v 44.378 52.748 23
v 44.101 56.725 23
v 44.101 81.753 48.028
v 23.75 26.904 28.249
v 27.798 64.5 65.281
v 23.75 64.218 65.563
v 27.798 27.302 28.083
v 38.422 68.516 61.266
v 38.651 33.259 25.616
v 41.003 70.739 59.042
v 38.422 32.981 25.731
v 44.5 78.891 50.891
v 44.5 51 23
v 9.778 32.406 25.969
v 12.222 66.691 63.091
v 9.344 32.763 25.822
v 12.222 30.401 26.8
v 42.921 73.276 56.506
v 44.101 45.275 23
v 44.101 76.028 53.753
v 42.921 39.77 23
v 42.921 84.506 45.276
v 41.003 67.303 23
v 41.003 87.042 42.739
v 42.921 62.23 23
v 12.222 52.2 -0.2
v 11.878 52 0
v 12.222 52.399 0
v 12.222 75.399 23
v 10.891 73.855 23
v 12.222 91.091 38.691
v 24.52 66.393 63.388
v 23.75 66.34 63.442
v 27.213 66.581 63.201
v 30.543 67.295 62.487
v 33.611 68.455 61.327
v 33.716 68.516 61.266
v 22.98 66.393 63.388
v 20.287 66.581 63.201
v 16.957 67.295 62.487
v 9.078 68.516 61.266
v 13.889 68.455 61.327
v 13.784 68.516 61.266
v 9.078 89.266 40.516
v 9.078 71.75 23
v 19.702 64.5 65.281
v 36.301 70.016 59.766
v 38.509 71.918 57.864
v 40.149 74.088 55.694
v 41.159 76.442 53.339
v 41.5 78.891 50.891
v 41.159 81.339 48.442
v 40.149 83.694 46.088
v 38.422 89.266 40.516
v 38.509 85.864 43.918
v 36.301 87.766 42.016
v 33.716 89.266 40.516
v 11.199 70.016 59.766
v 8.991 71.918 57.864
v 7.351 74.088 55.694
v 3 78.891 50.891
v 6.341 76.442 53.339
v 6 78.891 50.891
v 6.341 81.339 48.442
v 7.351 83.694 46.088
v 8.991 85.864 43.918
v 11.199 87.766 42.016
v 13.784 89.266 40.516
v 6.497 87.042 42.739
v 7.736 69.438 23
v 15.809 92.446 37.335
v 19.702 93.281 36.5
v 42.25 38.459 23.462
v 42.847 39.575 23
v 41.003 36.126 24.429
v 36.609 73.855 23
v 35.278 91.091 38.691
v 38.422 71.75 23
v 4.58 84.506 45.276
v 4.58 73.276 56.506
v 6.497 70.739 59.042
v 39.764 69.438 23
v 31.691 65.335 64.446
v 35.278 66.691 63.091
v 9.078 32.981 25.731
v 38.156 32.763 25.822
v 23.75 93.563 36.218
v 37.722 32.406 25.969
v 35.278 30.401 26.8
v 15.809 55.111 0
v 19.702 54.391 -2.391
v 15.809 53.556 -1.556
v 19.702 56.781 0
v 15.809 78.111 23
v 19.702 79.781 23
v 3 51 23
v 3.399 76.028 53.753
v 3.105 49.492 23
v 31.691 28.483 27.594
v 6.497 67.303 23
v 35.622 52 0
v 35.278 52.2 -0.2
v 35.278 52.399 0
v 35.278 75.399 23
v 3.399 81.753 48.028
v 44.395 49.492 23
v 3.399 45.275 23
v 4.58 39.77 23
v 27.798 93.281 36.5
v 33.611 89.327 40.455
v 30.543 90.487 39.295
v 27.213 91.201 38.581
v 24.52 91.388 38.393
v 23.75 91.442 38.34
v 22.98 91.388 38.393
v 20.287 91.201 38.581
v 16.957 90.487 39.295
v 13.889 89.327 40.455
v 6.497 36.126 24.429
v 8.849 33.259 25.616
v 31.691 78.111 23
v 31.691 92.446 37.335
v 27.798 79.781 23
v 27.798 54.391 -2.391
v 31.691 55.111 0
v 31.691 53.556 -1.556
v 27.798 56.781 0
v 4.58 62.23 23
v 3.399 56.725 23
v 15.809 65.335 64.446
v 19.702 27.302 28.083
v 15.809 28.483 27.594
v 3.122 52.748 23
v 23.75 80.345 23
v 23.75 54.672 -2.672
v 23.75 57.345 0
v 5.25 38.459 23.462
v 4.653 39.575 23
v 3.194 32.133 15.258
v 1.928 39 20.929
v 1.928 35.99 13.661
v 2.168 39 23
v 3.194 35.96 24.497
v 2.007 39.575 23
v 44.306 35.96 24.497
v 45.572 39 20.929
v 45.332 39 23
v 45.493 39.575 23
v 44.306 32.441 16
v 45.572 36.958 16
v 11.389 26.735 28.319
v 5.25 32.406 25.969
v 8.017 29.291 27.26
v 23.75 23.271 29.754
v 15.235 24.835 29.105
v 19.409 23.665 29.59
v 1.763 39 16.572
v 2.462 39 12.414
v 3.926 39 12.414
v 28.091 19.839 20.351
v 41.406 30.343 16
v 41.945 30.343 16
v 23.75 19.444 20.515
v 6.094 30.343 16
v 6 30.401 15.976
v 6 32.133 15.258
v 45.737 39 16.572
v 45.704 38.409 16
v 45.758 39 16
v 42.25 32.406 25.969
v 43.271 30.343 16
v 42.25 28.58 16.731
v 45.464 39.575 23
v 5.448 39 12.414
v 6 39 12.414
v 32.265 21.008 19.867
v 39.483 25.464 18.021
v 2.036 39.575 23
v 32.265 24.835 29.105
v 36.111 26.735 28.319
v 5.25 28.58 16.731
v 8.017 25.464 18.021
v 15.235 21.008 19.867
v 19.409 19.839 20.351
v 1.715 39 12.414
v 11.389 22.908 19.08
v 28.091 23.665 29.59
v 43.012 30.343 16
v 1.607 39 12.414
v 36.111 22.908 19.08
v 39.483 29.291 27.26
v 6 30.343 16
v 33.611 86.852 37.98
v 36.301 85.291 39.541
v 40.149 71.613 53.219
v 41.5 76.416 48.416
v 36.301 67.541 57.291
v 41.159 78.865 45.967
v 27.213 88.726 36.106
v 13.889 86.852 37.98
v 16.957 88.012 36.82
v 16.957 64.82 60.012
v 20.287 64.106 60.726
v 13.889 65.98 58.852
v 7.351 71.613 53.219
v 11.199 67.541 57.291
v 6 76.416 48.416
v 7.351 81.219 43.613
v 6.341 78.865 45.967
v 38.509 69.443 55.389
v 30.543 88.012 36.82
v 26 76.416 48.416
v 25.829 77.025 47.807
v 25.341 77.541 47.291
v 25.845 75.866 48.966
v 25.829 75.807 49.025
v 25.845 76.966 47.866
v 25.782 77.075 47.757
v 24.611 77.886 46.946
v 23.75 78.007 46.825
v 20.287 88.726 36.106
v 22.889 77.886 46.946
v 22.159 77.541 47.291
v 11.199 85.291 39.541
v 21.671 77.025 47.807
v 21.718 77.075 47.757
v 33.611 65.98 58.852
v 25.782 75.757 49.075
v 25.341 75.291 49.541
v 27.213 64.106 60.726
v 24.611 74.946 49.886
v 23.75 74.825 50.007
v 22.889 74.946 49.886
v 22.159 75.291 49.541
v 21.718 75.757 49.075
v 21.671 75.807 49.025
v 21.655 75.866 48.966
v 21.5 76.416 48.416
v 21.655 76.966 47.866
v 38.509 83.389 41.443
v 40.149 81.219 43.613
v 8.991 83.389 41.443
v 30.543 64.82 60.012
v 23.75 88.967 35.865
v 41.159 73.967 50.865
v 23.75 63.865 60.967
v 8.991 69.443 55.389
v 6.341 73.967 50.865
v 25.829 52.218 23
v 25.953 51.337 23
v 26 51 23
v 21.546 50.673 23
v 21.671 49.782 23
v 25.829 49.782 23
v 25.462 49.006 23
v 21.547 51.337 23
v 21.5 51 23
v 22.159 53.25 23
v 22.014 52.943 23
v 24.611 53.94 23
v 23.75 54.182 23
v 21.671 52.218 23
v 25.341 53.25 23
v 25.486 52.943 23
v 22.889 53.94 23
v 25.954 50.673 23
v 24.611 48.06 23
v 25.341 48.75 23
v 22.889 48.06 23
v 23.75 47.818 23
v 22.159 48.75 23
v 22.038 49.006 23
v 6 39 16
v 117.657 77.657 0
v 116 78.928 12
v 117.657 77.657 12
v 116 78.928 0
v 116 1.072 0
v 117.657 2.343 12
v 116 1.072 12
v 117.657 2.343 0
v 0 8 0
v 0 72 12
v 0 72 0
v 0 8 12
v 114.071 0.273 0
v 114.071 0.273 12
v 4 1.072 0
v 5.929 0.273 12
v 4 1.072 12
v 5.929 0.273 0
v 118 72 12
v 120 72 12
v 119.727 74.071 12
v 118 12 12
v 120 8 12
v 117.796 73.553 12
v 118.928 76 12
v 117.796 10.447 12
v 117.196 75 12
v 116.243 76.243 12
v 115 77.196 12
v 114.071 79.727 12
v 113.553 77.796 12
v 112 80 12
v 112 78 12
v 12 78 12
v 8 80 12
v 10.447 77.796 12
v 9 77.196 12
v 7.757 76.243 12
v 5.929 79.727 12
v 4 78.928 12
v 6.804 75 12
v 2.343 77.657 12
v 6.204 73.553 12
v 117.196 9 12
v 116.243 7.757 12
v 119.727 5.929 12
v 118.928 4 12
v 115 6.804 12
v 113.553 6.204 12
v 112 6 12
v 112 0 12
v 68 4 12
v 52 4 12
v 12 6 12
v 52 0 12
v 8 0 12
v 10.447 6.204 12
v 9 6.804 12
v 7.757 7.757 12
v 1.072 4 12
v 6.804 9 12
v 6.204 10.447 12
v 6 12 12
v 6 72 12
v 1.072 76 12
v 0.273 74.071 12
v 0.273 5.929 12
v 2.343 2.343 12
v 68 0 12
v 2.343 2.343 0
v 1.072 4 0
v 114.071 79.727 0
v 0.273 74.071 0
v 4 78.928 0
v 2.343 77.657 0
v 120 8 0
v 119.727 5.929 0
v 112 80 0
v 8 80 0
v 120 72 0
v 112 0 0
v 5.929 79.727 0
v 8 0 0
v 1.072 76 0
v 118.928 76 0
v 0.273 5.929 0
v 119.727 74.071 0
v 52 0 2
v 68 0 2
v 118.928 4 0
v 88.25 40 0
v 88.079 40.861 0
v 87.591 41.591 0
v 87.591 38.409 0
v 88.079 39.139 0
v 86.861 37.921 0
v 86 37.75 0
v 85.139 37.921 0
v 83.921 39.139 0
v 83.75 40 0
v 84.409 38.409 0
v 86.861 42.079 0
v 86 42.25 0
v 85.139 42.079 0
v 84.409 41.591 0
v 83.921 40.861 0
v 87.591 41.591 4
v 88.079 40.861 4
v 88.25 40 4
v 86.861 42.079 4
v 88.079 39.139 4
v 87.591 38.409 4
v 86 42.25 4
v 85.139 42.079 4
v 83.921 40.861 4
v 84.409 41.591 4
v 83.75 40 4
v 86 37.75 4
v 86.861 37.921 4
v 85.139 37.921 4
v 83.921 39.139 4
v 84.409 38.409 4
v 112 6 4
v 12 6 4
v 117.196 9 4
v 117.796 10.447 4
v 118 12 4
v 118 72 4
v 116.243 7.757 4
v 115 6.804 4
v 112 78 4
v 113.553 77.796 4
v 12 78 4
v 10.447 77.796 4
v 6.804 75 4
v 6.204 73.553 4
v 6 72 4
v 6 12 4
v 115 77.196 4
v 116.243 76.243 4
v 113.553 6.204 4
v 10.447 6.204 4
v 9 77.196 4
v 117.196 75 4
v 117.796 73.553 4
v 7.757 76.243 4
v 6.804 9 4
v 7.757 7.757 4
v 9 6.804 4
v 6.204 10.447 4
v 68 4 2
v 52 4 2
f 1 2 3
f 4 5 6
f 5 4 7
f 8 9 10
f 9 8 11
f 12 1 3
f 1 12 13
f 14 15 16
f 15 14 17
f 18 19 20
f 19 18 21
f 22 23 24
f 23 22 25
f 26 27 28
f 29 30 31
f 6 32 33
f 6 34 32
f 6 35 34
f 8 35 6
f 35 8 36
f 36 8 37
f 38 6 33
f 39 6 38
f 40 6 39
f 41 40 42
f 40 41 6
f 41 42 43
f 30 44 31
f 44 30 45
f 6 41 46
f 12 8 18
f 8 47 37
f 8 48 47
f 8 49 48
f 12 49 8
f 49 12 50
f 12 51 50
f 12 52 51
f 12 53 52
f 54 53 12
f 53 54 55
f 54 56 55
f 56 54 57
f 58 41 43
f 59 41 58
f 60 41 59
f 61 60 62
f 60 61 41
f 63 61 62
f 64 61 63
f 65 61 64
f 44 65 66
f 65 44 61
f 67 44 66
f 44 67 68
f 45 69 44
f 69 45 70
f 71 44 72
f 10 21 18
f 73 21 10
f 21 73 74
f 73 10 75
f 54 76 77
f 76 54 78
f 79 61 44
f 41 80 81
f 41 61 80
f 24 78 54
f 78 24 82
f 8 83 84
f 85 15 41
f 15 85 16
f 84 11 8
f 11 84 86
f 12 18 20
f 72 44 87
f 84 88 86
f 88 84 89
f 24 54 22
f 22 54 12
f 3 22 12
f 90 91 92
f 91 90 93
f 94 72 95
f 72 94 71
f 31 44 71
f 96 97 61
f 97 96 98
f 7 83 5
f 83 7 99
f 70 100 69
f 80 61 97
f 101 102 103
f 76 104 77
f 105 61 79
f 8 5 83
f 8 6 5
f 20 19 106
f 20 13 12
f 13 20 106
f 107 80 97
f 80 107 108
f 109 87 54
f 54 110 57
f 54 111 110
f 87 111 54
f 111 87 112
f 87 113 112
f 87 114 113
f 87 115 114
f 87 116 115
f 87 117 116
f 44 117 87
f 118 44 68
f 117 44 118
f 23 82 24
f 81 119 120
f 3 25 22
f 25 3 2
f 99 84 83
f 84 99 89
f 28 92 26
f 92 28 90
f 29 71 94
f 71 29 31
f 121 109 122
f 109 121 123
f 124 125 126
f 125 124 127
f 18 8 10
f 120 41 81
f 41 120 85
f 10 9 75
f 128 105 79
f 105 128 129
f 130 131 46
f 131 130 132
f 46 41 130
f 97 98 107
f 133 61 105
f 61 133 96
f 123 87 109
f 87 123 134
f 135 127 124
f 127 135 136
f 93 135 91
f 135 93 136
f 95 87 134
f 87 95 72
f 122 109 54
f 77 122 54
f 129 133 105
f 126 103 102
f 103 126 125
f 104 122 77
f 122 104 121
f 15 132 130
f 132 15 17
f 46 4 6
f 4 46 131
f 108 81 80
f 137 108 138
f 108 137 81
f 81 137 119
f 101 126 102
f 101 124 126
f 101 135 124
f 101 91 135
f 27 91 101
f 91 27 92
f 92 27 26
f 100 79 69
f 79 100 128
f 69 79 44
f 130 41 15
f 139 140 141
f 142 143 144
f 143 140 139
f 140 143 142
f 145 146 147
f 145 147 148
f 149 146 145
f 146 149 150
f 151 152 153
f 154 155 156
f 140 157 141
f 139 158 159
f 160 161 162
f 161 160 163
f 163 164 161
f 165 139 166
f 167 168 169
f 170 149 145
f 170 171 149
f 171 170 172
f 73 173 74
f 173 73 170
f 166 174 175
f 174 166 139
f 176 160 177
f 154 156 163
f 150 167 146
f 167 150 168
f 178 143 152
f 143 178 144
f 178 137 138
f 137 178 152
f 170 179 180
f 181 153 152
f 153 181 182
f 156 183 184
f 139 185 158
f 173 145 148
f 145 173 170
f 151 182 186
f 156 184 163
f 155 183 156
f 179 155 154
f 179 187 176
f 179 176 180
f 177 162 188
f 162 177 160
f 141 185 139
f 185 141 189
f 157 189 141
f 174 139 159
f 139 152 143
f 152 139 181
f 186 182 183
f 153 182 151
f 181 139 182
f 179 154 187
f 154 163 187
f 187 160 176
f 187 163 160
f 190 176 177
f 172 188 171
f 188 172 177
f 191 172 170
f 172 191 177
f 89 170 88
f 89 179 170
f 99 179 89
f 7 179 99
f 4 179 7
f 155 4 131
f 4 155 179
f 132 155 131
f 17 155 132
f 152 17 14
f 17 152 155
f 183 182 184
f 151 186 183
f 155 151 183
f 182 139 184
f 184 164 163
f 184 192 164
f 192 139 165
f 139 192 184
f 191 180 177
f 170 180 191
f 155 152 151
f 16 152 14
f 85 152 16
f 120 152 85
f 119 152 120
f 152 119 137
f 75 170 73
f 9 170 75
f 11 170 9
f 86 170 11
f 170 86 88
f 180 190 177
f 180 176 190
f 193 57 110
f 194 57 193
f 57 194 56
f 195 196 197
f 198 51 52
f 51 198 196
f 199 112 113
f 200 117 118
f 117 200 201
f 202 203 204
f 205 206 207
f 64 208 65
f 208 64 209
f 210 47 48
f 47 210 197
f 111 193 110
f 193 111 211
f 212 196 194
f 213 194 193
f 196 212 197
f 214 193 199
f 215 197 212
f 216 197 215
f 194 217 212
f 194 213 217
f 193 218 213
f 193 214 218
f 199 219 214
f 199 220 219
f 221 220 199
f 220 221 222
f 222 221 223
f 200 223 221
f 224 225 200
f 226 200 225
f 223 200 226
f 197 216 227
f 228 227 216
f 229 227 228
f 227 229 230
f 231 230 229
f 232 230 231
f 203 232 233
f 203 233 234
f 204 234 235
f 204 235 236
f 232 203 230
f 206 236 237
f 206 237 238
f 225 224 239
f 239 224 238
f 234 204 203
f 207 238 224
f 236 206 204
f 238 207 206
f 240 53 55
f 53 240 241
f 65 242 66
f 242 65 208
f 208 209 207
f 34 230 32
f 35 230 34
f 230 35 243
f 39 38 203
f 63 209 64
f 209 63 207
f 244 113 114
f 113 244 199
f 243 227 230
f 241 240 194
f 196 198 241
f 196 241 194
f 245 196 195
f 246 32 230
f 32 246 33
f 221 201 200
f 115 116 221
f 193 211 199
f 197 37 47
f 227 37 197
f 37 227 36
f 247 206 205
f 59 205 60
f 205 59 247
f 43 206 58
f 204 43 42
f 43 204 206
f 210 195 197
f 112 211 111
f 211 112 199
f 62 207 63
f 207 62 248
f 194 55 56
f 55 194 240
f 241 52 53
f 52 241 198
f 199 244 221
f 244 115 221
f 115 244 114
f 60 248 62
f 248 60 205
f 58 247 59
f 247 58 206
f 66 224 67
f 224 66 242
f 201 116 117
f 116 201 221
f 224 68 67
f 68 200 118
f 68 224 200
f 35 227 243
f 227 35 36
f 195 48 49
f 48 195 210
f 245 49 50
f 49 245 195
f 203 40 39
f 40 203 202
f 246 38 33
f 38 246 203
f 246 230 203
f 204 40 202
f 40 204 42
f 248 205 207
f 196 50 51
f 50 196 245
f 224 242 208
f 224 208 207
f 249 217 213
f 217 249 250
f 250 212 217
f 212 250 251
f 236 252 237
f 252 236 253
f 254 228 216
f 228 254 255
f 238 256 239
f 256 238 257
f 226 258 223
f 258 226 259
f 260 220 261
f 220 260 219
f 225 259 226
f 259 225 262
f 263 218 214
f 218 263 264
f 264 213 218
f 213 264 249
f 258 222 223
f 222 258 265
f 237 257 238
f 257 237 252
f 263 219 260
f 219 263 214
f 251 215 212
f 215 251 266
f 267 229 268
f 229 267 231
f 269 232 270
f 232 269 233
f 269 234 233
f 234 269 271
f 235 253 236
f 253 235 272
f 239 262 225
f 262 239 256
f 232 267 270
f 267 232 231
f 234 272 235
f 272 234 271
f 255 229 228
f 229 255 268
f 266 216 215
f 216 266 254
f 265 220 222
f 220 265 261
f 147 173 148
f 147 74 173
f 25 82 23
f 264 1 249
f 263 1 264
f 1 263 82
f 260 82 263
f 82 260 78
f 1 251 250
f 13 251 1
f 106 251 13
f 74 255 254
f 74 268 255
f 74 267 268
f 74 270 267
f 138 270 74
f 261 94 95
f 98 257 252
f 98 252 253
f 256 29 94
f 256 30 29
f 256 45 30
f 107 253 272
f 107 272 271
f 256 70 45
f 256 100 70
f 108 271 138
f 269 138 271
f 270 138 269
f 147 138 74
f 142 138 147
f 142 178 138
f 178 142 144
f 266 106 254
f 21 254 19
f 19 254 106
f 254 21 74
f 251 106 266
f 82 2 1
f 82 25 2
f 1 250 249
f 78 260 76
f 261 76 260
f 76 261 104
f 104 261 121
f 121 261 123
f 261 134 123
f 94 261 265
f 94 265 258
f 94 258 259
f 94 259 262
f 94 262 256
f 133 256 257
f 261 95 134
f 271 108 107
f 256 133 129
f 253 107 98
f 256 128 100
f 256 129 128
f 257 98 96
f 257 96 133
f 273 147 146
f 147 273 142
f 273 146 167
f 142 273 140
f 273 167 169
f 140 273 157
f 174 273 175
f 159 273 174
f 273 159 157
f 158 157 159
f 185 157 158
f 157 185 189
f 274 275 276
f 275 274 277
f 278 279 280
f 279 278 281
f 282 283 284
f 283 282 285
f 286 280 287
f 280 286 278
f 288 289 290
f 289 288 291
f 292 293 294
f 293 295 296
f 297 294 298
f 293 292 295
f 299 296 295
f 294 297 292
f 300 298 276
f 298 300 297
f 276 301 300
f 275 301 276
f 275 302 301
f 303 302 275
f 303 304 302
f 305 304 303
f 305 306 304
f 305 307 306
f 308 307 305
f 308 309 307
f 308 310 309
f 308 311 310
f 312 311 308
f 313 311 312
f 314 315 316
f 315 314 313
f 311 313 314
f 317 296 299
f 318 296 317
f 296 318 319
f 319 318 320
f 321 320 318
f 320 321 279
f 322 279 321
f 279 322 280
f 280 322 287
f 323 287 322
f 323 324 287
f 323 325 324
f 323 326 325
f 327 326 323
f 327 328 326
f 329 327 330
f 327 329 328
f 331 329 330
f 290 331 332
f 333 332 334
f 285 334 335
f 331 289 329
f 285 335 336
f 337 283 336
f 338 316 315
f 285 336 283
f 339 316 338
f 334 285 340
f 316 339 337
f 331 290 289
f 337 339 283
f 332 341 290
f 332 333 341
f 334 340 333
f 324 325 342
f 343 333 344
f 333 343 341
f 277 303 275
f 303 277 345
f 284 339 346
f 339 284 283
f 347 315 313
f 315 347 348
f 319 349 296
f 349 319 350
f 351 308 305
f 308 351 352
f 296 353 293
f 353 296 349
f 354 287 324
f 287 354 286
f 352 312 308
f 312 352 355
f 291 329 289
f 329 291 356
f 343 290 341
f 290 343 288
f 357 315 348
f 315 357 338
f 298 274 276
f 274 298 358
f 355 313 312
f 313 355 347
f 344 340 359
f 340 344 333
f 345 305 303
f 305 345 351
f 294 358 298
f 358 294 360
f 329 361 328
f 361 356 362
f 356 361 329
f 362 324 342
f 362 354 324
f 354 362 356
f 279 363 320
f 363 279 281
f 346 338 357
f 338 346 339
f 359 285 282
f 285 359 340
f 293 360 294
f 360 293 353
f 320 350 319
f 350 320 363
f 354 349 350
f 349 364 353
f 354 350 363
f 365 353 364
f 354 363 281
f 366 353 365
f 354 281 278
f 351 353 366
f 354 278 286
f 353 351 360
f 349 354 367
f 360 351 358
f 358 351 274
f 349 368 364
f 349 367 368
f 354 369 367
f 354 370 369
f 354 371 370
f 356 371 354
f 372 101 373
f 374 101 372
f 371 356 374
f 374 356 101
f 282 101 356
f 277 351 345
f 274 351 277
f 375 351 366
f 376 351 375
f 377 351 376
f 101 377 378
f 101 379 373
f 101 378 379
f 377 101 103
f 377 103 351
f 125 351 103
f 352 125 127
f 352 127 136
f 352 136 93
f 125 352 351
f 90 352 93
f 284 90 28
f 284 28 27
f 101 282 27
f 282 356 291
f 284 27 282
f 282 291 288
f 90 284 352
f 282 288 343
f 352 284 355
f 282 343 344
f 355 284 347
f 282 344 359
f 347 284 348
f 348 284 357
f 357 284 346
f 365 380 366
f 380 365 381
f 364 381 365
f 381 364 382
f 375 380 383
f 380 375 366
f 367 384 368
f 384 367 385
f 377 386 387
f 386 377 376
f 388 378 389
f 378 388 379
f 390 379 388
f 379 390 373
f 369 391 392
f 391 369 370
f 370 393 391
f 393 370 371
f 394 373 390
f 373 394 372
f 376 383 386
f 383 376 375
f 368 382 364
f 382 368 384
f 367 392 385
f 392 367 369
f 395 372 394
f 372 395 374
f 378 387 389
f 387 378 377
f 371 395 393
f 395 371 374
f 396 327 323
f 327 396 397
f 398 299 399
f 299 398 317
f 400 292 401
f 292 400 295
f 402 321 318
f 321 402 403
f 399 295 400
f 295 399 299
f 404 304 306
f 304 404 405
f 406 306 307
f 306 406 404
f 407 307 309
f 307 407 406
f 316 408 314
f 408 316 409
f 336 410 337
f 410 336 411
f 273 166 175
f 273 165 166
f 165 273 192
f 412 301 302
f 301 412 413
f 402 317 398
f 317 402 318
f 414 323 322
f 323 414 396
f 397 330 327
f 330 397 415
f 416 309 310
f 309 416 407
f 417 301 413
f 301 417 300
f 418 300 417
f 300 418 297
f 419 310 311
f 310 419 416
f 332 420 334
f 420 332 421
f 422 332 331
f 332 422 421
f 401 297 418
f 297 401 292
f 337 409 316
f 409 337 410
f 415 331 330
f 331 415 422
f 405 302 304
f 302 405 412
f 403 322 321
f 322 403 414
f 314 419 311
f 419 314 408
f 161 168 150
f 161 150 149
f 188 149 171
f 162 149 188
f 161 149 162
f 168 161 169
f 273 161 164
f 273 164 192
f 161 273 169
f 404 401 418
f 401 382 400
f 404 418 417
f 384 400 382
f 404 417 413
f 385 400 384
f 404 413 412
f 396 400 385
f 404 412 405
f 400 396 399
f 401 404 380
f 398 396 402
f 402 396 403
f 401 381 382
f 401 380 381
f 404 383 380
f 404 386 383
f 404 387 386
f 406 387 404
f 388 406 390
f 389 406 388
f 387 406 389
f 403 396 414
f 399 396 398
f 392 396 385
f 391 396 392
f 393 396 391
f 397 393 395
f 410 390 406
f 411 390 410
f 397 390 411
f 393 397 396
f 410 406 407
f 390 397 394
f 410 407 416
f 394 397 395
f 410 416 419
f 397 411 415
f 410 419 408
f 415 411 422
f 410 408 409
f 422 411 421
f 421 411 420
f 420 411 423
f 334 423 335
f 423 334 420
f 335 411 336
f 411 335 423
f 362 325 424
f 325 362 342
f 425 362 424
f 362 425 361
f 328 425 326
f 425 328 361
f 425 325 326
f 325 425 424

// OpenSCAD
// Apple Watch + AirPods Charging Dock — DUAL COLOR
// File: single color version (dual-color: dock_base + dock_accent)
// PETG — 0.2mm, 4 walls, 20% infill
// Channels for Apple Watch magnetic puck + AirPods flat charging
// Apple Watch band passes through slot below puck

WALL_T       = 3.0;
BASE_W       = 120;
BASE_D       = 80;
BASE_H       = 12;
WATCH_ANGLE  = 45;    // Watch face angle
POST_H       = 55;
PUCK_D       = 35.5;  // Apple Watch charger puck OD + play
PUCK_DEPTH   = 3.5;   // Puck sits this deep
CORD_D       = 4.5;   // Lightning / USB-C cord channel
BAND_SLOT_W  = 50;    // Band passes through here
BAND_SLOT_H  = 12;
PODS_W       = 62;    // AirPods case footprint
PODS_D       = 46;
PODS_H       = 3.5;   // Recessed pocket depth
CORNER_R     = 8;

module rounded_base(w, d, h, r) {
    minkowski() {
        cube([w - r*2, d - r*2, h - 1]);
        cylinder(r = r, h = 1, $fn = 24);
    }
}

module watch_post() {
    difference() {
        union() {
            // Angled post body
            rotate([-WATCH_ANGLE, 0, 0])
                cylinder(d = PUCK_D + WALL_T*2, h = POST_H, $fn = 32);
            // Fillet to base
            rotate([-WATCH_ANGLE * 0.5, 0, 0])
                cylinder(d = PUCK_D + WALL_T*3, h = 10, $fn = 32);
        }
        // Puck pocket at top of post
        rotate([-WATCH_ANGLE, 0, 0])
            translate([0, 0, POST_H - PUCK_DEPTH])
                cylinder(d = PUCK_D, h = PUCK_DEPTH + 1, $fn = 32);
        // Cord channel through post
        rotate([-WATCH_ANGLE, 0, 0])
            cylinder(d = CORD_D, h = POST_H + 2, $fn = 16);
        // Band slot
        translate([-BAND_SLOT_W/2, -1, -1])
            cube([BAND_SLOT_W, BASE_D, BAND_SLOT_H]);
    }
}

module airpods_pocket() {
    translate([BASE_W - PODS_W - WALL_T, (BASE_D - PODS_D)/2, BASE_H - PODS_H])
        difference() {
            cube([PODS_W, PODS_D, PODS_H + 1]);
            // Rounded corners
            for (x = [4, PODS_W - 4], y = [4, PODS_D - 4])
                translate([x, y, -1]) cylinder(r = 4, h = PODS_H + 3, $fn = 16);
        }
    // Cord exit hole
    translate([BASE_W - PODS_W/2 - WALL_T, BASE_D/2, -1])
        cylinder(d = CORD_D, h = BASE_H + 2, $fn = 16);
}

difference() {
    union() {
        translate([CORNER_R, CORNER_R, 0]) rounded_base(BASE_W, BASE_D, BASE_H, CORNER_R);
        translate([PUCK_D/2 + WALL_T * 2, BASE_D/2, BASE_H])
            watch_post();
    }
    // AirPods recess
    airpods_pocket();
    // Weight relief
    translate([CORNER_R + 4, CORNER_R + 4, 4])
        rounded_base(BASE_W - 8, BASE_D - 8, BASE_H, CORNER_R - 2);
    // Cable management slot on back
    translate([BASE_W/2 - 8, -1, 2])
        cube([16, WALL_T + 2, BASE_H]);
}
